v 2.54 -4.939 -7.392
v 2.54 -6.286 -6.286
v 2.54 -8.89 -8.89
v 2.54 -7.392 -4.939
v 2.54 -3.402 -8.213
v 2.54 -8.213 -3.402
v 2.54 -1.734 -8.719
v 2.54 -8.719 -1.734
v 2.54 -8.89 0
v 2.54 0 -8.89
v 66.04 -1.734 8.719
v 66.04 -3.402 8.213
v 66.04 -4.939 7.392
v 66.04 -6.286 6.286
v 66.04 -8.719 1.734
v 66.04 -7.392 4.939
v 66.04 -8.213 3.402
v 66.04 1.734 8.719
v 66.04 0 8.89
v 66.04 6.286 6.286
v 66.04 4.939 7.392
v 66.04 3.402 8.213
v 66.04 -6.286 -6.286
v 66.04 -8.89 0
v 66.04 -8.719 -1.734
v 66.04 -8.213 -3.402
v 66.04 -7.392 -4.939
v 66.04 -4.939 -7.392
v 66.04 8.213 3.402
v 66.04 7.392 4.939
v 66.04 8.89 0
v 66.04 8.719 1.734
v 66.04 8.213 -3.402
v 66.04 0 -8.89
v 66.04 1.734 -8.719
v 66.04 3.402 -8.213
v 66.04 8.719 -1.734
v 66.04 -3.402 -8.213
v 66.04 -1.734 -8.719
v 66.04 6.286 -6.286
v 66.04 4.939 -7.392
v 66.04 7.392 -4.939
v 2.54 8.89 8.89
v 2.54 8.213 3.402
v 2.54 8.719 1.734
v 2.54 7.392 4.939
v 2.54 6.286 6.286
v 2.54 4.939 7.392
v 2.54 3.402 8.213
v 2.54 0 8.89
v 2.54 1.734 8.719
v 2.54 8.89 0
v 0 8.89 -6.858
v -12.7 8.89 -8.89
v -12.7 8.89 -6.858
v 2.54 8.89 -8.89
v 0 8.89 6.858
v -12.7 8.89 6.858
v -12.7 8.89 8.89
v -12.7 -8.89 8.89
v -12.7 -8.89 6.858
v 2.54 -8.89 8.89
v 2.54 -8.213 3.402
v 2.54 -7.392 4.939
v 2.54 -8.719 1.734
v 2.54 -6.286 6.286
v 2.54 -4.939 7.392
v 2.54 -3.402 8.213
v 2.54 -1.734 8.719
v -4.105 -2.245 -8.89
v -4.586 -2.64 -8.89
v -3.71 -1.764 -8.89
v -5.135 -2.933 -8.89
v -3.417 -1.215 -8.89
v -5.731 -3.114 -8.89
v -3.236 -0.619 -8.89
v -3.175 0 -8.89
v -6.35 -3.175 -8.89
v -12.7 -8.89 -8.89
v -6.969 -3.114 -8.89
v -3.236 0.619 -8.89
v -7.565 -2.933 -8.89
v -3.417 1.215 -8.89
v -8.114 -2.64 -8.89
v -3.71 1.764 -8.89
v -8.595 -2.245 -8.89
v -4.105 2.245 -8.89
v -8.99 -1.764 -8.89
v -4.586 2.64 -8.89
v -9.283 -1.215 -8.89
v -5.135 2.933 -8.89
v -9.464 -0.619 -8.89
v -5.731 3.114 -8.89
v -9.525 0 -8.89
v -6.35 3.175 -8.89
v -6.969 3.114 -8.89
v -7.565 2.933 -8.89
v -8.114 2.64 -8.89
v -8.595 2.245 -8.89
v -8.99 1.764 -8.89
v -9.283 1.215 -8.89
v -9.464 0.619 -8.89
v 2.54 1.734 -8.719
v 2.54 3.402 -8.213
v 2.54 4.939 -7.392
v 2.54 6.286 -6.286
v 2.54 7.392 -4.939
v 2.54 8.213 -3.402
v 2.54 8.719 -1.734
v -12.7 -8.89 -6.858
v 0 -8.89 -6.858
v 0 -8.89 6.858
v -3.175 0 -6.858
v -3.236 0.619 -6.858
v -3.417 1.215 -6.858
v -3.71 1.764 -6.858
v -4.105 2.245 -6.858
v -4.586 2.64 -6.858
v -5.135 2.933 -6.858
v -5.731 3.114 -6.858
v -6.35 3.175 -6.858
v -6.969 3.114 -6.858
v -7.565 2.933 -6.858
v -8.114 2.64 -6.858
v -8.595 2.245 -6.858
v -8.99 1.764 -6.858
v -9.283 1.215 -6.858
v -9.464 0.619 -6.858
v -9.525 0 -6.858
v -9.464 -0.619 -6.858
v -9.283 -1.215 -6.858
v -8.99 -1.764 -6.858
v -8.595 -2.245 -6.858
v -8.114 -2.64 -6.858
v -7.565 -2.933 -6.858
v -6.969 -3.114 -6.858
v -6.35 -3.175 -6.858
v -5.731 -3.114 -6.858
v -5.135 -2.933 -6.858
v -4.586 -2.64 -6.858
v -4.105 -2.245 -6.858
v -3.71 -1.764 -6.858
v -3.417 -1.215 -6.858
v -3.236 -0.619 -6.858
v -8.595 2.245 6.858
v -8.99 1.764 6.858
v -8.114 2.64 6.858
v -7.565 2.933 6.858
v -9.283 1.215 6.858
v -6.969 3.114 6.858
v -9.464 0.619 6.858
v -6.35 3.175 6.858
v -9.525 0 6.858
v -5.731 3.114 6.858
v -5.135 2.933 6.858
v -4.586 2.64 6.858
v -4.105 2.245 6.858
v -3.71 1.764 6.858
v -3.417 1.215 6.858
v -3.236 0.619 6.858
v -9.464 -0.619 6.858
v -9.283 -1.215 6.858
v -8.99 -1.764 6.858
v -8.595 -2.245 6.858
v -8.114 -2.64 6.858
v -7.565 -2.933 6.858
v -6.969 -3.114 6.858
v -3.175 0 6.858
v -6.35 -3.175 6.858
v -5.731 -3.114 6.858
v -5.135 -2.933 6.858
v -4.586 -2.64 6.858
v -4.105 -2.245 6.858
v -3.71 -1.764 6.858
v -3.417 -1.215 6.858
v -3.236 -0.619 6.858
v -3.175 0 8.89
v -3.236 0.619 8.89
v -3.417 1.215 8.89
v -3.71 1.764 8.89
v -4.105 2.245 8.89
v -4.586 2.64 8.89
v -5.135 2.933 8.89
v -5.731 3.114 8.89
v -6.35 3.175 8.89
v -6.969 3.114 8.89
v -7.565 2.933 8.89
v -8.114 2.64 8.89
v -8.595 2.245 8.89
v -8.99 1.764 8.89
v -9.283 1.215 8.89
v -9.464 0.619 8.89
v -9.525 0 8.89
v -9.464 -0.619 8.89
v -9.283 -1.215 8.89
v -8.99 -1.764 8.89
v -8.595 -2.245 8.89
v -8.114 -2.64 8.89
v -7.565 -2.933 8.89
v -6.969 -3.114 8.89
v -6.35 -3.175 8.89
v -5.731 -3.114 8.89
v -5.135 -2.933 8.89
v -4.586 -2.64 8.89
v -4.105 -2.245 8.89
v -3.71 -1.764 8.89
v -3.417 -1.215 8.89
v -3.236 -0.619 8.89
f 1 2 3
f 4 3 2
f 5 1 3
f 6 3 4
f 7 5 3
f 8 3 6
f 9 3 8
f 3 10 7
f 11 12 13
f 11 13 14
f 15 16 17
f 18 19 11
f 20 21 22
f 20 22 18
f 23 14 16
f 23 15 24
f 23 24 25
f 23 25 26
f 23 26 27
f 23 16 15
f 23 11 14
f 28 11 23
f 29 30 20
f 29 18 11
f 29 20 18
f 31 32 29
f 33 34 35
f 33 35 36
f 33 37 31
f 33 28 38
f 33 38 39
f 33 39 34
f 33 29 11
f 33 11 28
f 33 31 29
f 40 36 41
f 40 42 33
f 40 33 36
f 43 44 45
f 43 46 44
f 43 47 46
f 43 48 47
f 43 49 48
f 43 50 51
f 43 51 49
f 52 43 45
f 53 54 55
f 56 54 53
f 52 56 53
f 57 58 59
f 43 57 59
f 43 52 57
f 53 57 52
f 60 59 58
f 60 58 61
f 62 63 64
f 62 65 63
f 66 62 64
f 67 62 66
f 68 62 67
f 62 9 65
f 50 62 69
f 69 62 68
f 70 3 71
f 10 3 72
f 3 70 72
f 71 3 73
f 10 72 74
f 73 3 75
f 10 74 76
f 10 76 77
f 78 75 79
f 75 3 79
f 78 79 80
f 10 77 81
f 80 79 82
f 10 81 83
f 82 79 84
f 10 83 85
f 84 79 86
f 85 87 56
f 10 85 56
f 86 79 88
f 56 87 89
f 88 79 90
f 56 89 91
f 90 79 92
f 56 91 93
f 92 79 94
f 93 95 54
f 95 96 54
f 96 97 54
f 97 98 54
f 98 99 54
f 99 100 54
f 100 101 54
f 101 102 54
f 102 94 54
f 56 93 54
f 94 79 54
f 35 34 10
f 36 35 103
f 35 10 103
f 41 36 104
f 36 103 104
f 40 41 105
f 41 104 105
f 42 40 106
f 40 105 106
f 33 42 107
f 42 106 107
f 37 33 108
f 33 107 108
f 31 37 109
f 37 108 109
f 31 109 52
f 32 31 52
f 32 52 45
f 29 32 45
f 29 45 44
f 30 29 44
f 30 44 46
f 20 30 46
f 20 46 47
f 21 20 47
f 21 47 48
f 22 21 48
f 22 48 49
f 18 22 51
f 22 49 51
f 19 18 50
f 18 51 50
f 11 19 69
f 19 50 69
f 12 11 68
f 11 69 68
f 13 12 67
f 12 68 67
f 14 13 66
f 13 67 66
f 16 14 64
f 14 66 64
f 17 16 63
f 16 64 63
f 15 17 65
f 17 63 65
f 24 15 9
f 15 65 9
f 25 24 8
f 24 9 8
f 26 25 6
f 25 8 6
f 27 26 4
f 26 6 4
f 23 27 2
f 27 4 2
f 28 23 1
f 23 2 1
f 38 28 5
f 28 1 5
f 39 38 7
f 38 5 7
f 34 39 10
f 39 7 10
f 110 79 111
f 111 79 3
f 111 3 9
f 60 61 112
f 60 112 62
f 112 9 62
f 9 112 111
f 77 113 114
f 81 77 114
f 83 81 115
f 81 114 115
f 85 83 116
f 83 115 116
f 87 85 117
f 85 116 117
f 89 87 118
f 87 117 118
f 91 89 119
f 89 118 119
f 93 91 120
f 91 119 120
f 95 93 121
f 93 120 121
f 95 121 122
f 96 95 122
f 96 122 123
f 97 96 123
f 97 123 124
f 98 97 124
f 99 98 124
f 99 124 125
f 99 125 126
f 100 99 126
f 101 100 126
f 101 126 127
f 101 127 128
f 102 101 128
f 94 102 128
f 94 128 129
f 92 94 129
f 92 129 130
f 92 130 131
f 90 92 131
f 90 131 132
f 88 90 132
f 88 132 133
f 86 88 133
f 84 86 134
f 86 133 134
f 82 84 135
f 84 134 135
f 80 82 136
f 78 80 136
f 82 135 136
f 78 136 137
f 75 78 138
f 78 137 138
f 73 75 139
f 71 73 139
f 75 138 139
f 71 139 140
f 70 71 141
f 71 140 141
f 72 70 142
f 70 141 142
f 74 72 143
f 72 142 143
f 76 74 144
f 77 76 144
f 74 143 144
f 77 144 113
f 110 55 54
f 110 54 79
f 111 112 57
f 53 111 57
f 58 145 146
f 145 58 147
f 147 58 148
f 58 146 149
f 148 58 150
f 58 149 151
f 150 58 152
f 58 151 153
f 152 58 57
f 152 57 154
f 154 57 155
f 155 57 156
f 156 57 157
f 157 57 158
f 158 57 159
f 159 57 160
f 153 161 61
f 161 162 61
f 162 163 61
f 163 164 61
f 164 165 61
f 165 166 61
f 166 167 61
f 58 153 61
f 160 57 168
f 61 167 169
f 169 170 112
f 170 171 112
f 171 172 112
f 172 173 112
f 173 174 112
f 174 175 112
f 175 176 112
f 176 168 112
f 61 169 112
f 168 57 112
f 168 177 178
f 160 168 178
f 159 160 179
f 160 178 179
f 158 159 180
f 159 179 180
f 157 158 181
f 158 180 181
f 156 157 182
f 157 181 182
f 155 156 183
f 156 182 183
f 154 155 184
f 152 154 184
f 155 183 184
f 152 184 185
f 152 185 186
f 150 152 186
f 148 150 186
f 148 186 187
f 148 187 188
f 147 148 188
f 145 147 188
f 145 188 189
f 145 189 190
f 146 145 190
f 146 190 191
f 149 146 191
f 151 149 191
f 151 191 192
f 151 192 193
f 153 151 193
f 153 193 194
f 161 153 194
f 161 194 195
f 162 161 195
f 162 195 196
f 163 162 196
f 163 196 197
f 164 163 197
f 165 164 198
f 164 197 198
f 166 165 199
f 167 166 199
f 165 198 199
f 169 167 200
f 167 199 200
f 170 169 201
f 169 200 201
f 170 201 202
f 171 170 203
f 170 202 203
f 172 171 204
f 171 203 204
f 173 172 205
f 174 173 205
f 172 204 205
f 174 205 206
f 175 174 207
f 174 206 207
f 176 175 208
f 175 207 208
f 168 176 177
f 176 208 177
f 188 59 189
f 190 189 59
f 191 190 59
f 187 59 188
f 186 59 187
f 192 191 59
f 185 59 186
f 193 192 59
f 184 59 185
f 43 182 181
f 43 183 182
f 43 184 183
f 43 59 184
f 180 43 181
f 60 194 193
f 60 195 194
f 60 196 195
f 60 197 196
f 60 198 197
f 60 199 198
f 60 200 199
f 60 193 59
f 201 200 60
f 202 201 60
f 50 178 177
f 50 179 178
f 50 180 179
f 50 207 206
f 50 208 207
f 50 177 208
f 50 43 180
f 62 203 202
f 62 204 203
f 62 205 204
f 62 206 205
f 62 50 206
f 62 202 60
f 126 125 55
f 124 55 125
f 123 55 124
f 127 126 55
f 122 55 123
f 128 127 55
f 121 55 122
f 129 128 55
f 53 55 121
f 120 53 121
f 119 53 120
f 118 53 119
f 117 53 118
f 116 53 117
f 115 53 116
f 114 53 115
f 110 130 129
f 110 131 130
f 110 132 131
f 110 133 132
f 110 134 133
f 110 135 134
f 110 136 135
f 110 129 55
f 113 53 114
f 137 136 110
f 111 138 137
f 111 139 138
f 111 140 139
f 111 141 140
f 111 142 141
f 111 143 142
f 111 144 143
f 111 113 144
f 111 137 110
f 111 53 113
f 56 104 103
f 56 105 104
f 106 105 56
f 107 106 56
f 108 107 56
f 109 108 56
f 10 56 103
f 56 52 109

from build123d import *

# Parameters (mm, degrees)
SKETCH2_W           = 17.78
SKETCH2_H           = 17.78
BOSS_EXTRUDE1_DEPTH = 2.54
SKETCH3_R           = 8.89
BOSS_EXTRUDE2_DEPTH = 63.5
SKETCH4_W           = 17.78
SKETCH4_H           = 2.032
BOSS_EXTRUDE3_DEPTH = 12.7
SKETCH5_R           = 3.175
CUT_EXTRUDE1_DEPTH  = 69.966963831


with BuildPart() as part:
    # Sketch2 → Boss-Extrude1 (new body)
    with BuildSketch(Plane.YZ):
        Rectangle(SKETCH2_W, SKETCH2_H)
    extrude(amount=BOSS_EXTRUDE1_DEPTH)

    # Sketch3 → Boss-Extrude2 (add)
    with BuildSketch(Plane(origin=(2.54, 0, 0), x_dir=(0, 0, -1), z_dir=(1, 0, 0))):
        Circle(SKETCH3_R)
    extrude(amount=BOSS_EXTRUDE2_DEPTH)

    # Sketch4 → Boss-Extrude3 (add)
    with BuildSketch(Plane(origin=(0, 0, 0), x_dir=(0, -1, 0), z_dir=(-1, 0, 0))):
        with Locations((0, 7.874)):
            Rectangle(SKETCH4_W, SKETCH4_H)
        with Locations((0, -7.874)):
            Rectangle(SKETCH4_W, SKETCH4_H)
    extrude(amount=BOSS_EXTRUDE3_DEPTH)

    # Sketch5 → Cut-Extrude1 (cut, through all)
    with BuildSketch(Plane.XY.offset(8.89)):
        with Locations((-6.35, 0)):
            Circle(SKETCH5_R)
    extrude(amount=-CUT_EXTRUDE1_DEPTH, mode=Mode.SUBTRACT)


solid = part.part
